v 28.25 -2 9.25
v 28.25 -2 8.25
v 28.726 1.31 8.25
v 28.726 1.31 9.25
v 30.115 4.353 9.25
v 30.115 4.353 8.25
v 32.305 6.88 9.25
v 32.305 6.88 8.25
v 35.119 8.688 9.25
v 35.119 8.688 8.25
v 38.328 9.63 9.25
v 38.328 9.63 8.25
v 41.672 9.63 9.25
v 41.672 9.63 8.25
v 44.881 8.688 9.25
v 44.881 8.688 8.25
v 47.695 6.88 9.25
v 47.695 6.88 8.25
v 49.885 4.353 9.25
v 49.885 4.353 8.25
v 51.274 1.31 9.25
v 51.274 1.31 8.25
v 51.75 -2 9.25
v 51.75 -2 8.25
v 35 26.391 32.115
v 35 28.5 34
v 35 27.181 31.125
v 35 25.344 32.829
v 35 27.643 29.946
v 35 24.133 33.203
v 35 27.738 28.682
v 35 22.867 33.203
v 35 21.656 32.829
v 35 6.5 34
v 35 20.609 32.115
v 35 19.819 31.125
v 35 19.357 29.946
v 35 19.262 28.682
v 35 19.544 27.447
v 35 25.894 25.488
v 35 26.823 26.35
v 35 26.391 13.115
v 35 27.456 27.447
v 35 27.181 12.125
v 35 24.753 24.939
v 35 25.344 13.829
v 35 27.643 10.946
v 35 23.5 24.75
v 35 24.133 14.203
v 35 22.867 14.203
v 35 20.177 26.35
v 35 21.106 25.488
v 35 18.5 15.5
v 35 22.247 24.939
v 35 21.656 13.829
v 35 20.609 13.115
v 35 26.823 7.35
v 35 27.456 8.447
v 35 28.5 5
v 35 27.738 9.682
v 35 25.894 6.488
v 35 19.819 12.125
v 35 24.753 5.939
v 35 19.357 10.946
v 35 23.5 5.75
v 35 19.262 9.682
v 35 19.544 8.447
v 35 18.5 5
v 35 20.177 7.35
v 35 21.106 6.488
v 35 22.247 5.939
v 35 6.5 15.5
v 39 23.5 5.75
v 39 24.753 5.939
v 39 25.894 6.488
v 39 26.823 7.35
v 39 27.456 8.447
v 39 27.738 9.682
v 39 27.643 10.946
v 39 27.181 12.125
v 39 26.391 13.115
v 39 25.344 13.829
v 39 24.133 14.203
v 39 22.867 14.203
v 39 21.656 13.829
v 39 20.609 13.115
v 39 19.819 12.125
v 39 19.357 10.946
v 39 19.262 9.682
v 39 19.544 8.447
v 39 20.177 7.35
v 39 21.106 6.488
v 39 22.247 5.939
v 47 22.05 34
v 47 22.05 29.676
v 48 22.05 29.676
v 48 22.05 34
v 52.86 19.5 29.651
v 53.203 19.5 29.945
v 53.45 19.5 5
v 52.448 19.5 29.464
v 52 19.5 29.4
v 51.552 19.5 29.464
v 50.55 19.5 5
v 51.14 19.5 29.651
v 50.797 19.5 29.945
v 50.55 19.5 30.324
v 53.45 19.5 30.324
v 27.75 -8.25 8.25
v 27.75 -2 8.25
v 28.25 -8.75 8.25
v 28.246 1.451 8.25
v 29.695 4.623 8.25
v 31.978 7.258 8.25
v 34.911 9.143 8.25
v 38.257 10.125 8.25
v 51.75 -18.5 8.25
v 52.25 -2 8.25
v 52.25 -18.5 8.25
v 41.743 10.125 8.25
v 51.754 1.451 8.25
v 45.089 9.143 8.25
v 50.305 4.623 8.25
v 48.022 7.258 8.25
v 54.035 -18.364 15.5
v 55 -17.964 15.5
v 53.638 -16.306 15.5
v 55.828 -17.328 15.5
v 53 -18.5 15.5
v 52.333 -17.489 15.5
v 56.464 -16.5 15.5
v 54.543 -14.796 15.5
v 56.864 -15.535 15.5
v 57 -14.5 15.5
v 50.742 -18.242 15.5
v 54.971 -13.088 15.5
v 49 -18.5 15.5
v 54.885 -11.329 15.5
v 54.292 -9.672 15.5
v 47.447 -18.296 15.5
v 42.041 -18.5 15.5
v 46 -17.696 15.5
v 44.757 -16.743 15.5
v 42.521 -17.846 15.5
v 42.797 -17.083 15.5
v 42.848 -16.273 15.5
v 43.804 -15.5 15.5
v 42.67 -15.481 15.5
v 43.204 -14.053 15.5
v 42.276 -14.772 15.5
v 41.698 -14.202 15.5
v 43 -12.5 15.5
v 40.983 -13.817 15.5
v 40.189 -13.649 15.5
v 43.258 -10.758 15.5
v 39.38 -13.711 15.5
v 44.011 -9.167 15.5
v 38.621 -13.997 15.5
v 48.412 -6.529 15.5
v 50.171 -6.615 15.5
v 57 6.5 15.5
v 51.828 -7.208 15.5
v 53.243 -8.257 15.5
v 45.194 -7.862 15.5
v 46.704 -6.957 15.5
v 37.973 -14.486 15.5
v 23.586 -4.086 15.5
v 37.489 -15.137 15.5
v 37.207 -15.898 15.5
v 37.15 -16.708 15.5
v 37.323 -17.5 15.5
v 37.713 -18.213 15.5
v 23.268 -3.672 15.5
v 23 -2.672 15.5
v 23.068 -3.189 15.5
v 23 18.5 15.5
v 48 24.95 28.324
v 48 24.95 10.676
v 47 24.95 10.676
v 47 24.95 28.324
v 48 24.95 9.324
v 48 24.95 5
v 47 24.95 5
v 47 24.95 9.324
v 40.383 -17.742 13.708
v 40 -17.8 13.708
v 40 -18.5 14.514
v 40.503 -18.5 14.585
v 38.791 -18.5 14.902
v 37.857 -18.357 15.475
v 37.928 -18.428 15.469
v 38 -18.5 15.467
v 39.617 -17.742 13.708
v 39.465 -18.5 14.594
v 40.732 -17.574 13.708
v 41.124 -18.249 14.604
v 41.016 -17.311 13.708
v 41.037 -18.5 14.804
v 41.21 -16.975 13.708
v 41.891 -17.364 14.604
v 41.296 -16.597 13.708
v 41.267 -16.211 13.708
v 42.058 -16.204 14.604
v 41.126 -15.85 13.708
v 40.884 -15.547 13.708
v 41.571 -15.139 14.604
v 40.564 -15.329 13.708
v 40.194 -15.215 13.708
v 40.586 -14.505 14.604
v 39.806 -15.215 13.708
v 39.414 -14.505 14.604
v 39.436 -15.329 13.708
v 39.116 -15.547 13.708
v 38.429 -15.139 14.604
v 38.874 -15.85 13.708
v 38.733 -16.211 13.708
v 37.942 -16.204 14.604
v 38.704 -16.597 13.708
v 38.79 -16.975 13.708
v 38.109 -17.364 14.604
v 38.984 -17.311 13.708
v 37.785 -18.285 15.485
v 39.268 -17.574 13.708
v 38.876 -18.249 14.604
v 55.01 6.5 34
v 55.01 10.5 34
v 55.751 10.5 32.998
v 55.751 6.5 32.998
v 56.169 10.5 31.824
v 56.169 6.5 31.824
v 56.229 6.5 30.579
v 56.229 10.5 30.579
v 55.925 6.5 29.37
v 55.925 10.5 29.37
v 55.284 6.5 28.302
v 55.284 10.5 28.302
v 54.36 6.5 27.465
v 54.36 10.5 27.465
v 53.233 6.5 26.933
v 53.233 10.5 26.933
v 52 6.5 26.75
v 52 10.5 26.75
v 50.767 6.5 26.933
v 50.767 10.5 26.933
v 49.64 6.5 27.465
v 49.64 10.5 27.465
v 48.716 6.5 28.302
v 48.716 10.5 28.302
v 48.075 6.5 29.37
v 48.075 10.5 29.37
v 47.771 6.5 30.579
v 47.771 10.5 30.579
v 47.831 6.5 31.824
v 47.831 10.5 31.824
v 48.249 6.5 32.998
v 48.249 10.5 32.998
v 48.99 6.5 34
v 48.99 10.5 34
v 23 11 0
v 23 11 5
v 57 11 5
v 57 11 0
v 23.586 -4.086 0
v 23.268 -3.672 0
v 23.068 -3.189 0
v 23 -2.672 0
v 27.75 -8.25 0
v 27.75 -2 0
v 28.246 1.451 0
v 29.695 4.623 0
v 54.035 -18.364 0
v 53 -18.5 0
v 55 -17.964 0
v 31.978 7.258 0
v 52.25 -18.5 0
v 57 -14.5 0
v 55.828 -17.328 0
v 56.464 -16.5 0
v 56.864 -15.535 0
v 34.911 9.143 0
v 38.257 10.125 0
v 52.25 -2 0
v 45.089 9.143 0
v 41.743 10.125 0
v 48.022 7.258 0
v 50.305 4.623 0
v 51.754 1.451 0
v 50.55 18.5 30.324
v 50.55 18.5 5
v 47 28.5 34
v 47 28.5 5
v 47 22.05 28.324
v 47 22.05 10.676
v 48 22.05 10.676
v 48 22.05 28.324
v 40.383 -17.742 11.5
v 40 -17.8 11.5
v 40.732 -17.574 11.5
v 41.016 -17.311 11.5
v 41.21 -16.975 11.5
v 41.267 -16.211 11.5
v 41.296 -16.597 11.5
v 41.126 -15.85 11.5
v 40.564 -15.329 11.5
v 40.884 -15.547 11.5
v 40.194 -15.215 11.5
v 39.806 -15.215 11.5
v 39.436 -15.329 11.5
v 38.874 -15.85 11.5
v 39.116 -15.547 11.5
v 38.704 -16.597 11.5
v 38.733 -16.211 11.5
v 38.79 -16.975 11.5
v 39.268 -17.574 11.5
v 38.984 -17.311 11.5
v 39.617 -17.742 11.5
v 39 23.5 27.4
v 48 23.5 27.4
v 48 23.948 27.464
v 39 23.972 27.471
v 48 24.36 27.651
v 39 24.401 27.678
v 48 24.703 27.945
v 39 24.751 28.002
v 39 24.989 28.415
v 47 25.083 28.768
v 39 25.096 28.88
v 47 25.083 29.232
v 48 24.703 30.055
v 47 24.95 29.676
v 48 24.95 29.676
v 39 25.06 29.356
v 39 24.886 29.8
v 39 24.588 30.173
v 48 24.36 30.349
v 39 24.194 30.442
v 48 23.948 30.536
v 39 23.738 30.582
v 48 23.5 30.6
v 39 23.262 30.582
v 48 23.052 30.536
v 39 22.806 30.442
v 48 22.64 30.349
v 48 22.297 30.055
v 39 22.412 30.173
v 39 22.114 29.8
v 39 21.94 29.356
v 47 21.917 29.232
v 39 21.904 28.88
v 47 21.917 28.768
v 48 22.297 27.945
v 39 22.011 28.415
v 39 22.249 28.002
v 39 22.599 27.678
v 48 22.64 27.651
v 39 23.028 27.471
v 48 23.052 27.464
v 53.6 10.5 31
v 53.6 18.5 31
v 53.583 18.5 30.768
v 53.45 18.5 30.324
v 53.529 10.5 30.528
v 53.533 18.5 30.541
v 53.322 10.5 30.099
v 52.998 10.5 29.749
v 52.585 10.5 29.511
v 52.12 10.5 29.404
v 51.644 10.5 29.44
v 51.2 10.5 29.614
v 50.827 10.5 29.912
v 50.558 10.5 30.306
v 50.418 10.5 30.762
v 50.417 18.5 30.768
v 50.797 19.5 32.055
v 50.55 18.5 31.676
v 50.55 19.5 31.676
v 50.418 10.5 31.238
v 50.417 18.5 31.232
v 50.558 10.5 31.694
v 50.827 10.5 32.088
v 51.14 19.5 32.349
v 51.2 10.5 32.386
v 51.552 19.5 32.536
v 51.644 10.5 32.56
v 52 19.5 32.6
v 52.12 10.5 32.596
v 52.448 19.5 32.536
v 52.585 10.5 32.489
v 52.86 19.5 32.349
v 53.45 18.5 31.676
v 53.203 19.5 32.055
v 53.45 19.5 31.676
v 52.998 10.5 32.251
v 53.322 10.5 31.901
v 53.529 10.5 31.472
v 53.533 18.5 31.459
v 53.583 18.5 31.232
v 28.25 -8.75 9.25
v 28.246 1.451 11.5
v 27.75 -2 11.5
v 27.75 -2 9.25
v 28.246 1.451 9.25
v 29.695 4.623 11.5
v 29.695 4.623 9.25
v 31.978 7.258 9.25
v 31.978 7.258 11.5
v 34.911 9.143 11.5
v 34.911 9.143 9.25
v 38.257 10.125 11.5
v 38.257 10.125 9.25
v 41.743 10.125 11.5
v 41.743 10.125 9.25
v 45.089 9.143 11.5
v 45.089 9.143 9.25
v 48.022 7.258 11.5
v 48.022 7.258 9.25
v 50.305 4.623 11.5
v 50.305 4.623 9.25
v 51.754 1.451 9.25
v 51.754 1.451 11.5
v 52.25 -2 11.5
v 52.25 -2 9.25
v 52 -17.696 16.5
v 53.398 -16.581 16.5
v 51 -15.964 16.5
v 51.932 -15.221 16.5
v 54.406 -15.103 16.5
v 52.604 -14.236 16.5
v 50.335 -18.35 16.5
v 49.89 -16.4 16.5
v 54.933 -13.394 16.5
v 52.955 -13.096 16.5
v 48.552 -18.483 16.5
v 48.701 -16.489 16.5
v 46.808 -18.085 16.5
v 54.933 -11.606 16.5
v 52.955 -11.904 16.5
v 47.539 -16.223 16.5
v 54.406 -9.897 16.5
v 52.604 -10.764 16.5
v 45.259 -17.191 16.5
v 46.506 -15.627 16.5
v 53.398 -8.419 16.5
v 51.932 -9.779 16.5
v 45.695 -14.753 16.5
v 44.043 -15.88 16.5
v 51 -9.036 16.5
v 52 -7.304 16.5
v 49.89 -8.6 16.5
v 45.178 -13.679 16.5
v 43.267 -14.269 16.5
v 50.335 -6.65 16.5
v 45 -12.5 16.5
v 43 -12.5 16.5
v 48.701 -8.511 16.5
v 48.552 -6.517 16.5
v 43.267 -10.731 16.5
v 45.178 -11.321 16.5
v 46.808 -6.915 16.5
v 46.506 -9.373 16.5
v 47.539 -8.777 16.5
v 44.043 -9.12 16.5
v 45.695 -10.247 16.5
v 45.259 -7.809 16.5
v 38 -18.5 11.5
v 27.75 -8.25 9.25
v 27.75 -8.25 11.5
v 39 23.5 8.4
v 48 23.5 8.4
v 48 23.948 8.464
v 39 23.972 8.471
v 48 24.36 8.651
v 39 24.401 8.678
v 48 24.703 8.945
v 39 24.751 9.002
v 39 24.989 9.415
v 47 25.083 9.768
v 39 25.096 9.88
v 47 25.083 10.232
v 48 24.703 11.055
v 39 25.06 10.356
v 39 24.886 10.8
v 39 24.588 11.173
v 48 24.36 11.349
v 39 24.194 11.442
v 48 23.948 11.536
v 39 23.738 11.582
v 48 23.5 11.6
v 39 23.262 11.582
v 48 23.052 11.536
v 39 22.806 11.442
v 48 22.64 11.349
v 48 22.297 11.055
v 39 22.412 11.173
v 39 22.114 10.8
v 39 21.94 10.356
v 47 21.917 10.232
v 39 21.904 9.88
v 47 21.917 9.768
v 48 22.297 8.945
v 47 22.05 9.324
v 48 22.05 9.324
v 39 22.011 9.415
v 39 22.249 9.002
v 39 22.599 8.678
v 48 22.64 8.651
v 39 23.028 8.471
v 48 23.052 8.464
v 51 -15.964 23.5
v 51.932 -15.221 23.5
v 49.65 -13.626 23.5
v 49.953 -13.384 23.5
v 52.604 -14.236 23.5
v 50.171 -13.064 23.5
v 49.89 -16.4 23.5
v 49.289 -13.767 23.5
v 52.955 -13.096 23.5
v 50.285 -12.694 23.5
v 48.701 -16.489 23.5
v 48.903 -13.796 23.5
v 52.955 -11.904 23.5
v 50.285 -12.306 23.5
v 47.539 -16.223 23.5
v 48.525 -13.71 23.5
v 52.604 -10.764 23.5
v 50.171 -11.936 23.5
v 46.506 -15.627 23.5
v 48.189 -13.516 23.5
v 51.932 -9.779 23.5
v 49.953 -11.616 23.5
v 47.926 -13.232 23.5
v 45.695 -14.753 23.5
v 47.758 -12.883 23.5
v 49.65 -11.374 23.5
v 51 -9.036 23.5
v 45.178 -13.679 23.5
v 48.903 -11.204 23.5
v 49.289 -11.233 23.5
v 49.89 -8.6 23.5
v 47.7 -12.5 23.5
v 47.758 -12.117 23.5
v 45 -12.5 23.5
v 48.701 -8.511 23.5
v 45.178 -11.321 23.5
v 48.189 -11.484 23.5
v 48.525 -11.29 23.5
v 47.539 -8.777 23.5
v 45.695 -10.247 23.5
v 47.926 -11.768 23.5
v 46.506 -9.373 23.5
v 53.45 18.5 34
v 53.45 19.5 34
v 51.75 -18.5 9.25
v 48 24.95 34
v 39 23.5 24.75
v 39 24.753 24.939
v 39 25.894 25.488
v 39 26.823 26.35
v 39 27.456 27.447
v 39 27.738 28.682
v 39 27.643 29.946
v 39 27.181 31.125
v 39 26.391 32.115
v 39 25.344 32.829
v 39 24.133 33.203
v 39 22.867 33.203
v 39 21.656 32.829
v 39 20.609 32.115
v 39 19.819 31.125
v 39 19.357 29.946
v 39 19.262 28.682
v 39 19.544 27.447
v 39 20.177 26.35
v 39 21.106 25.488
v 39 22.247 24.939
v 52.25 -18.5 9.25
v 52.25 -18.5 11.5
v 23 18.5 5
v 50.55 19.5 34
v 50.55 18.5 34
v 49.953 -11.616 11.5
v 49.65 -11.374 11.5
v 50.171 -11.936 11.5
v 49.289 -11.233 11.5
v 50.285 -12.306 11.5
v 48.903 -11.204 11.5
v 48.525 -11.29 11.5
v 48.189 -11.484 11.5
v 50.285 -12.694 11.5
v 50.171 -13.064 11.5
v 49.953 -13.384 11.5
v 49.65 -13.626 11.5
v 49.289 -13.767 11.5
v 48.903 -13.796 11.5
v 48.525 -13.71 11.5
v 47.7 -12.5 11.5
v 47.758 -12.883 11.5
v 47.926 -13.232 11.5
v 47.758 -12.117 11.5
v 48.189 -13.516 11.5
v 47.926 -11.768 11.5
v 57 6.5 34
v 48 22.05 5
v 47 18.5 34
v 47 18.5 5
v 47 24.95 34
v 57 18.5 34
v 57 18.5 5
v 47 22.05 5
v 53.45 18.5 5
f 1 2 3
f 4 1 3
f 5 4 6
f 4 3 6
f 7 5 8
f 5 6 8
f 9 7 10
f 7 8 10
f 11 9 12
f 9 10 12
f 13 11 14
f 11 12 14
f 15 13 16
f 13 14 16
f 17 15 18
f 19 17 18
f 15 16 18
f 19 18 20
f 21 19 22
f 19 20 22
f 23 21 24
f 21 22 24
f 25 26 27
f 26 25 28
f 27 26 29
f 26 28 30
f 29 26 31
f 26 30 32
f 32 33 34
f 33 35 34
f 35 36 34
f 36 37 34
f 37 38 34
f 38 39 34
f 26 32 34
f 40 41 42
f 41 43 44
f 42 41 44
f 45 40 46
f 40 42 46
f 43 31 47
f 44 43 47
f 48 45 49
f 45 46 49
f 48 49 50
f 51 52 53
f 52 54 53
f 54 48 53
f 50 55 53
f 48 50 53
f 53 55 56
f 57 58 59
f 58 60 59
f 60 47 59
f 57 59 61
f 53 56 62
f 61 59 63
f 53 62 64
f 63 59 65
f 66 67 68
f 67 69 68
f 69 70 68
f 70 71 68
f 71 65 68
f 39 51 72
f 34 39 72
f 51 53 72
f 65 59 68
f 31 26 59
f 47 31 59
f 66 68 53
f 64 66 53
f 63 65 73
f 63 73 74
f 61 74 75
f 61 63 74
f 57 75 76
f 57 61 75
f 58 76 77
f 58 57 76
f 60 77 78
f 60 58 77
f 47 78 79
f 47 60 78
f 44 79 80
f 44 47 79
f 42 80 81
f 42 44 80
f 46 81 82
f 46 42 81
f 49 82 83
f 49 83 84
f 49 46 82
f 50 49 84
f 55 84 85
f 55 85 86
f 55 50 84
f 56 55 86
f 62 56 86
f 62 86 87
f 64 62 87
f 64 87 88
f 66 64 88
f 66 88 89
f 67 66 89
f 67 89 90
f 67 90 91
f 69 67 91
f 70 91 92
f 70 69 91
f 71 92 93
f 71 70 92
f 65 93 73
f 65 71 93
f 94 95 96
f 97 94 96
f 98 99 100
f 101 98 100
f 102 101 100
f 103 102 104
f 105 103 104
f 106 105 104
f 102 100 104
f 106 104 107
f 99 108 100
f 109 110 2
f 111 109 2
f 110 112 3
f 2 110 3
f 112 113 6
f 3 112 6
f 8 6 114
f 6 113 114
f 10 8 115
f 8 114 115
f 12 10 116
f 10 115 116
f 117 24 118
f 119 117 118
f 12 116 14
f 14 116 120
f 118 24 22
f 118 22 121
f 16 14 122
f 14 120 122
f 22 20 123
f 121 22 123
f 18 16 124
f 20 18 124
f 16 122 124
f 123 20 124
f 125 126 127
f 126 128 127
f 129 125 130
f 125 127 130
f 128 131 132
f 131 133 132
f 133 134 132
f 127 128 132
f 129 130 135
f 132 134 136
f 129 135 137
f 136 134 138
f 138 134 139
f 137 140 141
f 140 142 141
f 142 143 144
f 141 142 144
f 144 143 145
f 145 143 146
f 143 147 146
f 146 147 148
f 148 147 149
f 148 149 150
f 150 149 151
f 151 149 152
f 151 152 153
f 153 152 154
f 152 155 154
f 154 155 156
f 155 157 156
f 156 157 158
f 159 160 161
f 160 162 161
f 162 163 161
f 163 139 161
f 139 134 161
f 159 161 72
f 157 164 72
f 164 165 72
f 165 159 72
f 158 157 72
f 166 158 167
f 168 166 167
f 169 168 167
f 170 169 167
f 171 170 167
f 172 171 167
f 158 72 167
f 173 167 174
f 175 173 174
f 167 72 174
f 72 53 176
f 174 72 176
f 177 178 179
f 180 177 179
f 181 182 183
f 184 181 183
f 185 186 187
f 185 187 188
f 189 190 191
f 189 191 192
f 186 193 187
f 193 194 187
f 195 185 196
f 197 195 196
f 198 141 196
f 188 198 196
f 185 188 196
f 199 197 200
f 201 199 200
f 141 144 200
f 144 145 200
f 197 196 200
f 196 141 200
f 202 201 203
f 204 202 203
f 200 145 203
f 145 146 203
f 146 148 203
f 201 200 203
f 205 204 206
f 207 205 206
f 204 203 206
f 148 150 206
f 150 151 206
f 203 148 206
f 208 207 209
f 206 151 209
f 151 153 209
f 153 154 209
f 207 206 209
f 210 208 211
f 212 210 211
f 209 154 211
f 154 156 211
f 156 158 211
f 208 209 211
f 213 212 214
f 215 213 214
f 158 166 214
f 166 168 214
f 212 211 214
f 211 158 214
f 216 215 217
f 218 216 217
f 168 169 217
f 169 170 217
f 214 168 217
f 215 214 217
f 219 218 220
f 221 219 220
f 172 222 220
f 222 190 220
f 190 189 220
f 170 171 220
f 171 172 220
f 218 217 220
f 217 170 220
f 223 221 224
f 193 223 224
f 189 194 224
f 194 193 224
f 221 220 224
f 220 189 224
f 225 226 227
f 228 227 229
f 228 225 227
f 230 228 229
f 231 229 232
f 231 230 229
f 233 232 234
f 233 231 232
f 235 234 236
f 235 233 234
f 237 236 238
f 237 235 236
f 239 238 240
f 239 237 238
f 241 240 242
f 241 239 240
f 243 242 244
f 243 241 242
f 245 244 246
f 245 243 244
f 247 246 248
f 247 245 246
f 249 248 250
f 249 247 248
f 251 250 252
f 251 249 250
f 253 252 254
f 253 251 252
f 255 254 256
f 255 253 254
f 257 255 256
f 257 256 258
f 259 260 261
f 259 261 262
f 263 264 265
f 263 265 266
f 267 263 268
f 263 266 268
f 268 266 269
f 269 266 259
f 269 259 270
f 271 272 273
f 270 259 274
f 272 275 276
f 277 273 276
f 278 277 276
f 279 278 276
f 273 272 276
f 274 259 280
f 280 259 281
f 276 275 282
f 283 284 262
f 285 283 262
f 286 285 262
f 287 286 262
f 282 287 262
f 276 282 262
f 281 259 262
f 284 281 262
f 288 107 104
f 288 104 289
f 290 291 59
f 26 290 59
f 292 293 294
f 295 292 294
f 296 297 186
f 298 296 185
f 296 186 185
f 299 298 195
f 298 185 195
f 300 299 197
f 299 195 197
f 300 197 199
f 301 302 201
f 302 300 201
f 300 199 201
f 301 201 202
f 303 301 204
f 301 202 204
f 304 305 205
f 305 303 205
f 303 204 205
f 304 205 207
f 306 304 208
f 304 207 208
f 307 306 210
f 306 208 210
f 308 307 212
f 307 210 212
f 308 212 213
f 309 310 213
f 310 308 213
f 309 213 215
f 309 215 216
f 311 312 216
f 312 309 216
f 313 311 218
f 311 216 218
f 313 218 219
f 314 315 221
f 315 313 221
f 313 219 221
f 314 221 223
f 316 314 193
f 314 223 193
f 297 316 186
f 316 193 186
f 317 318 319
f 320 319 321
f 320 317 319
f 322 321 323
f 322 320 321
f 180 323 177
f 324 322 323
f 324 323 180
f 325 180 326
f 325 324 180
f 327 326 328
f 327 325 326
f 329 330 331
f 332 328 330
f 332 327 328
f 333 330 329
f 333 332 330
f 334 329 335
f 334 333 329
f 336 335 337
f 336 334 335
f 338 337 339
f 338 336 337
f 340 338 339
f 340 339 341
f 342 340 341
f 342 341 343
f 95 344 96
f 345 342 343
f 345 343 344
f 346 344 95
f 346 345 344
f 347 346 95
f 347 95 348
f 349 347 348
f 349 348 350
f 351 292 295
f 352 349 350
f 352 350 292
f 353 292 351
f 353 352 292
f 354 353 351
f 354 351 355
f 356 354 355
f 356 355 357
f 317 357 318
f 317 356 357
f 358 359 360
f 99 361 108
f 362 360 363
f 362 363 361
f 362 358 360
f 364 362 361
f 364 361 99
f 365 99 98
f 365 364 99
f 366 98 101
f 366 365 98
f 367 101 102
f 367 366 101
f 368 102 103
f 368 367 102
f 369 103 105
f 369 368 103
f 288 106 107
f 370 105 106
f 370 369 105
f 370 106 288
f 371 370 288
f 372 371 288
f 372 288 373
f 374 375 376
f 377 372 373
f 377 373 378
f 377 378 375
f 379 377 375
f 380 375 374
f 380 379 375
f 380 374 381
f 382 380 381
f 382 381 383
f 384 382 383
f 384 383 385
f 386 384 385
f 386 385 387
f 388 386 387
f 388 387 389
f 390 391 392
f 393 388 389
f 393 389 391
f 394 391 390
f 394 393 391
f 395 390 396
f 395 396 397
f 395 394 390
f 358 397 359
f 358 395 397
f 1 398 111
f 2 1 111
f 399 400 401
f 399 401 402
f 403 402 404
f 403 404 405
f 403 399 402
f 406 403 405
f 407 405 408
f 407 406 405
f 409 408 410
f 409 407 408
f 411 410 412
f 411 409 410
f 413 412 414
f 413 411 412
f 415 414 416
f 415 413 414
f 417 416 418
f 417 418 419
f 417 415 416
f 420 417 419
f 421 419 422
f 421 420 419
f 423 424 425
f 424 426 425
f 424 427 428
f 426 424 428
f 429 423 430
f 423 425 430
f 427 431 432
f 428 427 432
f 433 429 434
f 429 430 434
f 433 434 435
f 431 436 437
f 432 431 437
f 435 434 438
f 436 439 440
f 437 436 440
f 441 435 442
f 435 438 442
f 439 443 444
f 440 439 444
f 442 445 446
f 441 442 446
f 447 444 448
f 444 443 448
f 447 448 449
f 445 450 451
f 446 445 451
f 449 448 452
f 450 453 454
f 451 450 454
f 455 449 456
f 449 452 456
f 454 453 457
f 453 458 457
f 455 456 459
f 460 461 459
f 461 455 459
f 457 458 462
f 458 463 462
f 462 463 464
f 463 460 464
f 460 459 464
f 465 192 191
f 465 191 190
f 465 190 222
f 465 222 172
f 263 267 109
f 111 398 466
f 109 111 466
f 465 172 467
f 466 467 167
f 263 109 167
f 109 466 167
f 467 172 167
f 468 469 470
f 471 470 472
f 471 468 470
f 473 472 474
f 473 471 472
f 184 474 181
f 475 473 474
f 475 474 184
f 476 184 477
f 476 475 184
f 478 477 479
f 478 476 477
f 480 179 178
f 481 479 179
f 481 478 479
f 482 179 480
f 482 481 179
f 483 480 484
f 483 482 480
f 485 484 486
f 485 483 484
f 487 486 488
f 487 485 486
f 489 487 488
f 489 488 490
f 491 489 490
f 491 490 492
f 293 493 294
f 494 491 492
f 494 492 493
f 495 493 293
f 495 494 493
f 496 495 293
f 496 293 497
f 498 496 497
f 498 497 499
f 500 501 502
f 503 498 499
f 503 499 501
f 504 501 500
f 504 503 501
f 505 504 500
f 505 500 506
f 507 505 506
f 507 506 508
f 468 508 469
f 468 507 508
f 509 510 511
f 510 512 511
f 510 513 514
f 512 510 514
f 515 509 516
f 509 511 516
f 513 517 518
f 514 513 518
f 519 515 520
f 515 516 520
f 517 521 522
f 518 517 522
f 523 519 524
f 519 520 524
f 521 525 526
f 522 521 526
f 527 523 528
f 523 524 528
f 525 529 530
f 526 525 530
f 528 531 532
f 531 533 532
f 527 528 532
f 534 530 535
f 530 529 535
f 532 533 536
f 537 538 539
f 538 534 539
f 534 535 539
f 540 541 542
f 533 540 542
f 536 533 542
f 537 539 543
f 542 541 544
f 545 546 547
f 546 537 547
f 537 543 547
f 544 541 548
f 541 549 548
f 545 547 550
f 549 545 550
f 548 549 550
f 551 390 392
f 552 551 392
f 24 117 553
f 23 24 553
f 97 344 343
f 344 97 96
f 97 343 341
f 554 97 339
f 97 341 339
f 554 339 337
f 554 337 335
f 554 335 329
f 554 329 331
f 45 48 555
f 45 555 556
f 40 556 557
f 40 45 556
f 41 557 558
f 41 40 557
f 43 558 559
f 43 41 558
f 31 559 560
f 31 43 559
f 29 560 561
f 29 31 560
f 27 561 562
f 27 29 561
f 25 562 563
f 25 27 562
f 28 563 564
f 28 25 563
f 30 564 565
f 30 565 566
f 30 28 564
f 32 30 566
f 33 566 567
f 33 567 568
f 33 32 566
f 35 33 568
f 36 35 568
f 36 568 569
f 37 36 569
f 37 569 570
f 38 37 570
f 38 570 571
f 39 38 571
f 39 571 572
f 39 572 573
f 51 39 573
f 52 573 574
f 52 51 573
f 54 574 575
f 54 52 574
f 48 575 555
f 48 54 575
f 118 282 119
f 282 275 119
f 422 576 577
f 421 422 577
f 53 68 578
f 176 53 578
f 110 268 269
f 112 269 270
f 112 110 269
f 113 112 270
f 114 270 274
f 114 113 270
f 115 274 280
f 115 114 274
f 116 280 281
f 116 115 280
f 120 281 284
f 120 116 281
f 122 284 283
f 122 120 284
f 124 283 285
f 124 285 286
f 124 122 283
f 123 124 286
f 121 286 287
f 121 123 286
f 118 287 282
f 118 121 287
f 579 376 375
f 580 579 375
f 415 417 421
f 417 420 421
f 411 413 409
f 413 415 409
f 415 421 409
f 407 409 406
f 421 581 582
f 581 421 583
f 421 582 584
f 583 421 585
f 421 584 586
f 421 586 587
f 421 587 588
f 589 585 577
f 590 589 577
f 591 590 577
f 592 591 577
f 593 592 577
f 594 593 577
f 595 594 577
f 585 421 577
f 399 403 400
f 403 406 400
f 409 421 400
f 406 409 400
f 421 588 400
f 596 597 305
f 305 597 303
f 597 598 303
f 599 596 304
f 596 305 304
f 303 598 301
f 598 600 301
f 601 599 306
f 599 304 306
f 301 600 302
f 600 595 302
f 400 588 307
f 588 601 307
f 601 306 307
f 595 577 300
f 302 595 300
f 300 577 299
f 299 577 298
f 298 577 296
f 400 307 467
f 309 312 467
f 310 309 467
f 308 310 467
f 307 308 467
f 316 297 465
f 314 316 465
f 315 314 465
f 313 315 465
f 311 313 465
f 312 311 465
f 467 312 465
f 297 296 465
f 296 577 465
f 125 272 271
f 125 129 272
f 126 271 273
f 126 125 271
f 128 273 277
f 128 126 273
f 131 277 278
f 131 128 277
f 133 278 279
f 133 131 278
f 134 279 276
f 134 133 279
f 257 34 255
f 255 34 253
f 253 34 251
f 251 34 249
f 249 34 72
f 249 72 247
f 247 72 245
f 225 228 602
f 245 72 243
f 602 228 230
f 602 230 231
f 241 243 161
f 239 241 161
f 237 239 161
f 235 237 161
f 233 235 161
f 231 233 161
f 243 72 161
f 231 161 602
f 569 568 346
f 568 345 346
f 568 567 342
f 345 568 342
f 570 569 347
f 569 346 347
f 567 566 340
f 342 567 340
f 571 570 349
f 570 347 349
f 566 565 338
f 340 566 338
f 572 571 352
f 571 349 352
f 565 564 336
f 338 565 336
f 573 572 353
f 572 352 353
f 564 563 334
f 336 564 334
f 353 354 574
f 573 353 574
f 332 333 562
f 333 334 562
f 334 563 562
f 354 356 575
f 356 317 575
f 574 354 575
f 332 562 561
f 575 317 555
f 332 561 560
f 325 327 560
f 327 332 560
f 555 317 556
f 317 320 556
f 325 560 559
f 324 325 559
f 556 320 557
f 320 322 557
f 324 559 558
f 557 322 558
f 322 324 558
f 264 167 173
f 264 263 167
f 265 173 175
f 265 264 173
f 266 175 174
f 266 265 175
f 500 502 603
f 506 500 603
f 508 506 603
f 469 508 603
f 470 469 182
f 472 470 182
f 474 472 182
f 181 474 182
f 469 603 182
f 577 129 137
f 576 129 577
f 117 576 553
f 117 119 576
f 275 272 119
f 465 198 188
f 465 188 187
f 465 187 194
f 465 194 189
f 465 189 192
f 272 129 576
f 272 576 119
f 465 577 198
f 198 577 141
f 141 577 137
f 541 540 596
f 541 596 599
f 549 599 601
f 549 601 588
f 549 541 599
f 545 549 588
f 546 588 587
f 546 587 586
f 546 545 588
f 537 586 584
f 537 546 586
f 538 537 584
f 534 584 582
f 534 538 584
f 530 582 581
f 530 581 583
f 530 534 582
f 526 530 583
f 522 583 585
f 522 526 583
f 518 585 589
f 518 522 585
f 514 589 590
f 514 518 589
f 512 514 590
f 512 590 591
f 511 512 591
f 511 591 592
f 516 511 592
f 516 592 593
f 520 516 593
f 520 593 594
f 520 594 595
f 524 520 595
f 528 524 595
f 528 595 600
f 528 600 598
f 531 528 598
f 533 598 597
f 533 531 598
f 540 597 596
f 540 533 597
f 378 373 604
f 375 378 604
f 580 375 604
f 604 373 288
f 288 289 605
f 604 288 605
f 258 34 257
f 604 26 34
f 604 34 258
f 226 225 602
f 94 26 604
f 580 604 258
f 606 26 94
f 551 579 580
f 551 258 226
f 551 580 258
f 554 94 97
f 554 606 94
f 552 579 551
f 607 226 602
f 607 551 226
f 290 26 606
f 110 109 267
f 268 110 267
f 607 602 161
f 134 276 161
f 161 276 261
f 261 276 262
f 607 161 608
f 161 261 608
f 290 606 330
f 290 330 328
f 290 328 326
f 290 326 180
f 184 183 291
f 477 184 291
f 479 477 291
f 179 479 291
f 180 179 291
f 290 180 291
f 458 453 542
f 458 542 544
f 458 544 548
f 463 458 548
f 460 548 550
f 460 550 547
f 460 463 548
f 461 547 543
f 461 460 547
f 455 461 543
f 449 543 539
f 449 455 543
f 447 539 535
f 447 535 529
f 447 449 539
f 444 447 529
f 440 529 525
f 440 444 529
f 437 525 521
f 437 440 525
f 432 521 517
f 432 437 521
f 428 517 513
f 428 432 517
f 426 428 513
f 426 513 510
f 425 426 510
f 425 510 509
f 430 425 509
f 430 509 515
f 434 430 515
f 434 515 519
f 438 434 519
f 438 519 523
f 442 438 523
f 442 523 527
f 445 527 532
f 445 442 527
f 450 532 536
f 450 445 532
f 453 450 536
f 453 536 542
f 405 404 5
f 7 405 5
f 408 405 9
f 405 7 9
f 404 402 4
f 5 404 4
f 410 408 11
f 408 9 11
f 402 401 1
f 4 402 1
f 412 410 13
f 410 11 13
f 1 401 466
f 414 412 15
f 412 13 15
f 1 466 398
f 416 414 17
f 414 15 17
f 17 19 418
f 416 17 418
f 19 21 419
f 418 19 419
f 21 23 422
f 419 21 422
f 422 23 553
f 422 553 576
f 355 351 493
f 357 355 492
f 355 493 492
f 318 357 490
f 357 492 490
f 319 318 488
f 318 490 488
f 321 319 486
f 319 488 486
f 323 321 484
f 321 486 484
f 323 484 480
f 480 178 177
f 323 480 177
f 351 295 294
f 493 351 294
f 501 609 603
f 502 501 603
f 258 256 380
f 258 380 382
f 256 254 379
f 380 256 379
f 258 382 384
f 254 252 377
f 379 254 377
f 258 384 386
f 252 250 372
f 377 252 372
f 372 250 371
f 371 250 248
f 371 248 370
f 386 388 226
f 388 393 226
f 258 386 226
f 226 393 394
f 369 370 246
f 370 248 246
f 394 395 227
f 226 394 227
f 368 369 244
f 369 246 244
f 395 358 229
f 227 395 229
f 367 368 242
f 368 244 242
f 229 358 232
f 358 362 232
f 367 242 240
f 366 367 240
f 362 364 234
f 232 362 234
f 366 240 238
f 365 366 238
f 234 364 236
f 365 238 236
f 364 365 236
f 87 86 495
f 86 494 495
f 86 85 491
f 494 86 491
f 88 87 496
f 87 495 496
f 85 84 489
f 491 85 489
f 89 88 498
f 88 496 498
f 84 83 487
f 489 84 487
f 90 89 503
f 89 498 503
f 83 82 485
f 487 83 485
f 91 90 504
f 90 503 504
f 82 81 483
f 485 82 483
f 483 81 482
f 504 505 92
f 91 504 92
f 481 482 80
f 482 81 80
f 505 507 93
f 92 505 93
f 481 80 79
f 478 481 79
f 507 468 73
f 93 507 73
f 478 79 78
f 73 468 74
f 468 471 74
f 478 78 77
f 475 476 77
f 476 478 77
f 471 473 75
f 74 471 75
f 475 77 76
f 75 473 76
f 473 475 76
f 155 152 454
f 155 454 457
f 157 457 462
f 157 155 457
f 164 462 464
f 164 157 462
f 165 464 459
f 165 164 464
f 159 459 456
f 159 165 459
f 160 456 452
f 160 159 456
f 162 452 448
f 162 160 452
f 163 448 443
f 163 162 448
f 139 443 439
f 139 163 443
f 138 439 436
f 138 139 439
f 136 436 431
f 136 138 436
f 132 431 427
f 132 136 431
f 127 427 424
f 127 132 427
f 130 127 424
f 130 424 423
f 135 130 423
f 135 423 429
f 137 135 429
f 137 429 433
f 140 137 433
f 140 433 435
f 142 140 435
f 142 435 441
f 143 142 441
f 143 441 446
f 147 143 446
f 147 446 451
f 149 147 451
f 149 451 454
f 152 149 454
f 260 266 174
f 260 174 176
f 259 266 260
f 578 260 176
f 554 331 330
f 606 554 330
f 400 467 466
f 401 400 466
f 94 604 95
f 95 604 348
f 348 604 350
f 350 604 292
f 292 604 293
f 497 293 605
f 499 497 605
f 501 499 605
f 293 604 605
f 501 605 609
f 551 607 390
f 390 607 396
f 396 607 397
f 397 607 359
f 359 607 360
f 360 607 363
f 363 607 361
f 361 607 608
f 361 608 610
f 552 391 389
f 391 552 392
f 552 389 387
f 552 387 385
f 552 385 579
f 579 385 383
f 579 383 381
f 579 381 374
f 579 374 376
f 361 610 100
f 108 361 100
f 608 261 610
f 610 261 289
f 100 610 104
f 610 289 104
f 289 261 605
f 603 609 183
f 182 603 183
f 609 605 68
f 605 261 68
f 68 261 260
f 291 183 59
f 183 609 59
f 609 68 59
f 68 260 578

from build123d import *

# Parameters (mm, degrees)
BASE_SKETCHUP_W                   = 34
BASE_SKETCHUP_H                   = 37
BASE_EXTRUSION_DEPTH              = 15.5
FIX_EXTRUSION_DEPTH               = 34
BALL_EXTRUSION_DEPTH              = 29
BALL_BEARING_BASE_SKETCHUP_R      = 6
BALL_BEARING_BASE_EXTRUSION_DEPTH = 1
BALL_BEARING_SKETCHUP_R           = 4
BALL_BEARING_EXTRUSION_DEPTH      = 7
BALL_BEARING_FIX_SKETCHUP_R       = 1.3
BALL_BEARING_FIX_HOLE_DEPTH       = 12
BOSS_EXTRU_5_DEPTH                = 11.5
BOSS_EXTRU_6_DEPTH                = 1
ESQUISSE13_W                      = 5
ESQUISSE13_H                      = 17.5
ENL_V_MAT_EXTRU_1_DEPTH           = 35
CONG_2_R                          = 4
ENL_V_MAT_EXTRU_2_DEPTH           = 16.5
CONG_4_R                          = 2
ESQUISSE16_R                      = 1.6
MAKERBEAMINTERIORHOLES1_DEPTH     = 23
ESQUISSE17_R                      = 4.25
MAKERBEAMINTERIORHOLES2_DEPTH     = 4
ESQUISSE18_R                      = 1.6
MAKERBEAMFRONTHOLE1_DEPTH         = 23
ESQUISSE19_R                      = 4.25
MAKERBEAMFRONTHOLE2_DEPTH         = 4
ESQUISSE20_W                      = 37
ESQUISSE20_H                      = 47
ENL_V_MAT_EXTRU_7_DEPTH           = 35


with BuildPart() as part:
    # Base Sketchup → Base Extrusion (new body)
    with BuildSketch(Plane.XY):
        Rectangle(BASE_SKETCHUP_W, BASE_SKETCHUP_H)
    extrude(amount=BASE_EXTRUSION_DEPTH)


with BuildPart() as body_2:
    # Fix Sketchup → Fix Extrusion (new body)
    with BuildSketch(Plane(origin=(0, 0, 0), x_dir=(-1, 0, 0), z_dir=(0, 0, -1))):
        Polygon((17, 18.5), (13.45, 18.5), (13.45, 19.5), (10.55, 19.5), (10.55, 18.5), (7, 18.5), (7, 22.05), (8, 22.05), (8, 24.95), (7, 24.95), (7, 28.5), (-5, 28.5), (-5, 6.5), (17, 6.5), align=None)
    extrude(amount=-FIX_EXTRUSION_DEPTH)


with BuildPart() as ball_extrusion_tool:
    # Ball Place Sketchup → Ball Extrusion (new body)
    with BuildSketch(Plane.XZ.offset(18.5)):
        Polygon((-12.25, 0), (-12.25, 8.25), (-11.75, 8.25), (-11.75, 9.25), (-12.25, 9.25), (-12.25, 11.5), (12.25, 11.5), (12.25, 9.25), (11.75, 9.25), (11.75, 8.25), (12.25, 8.25), (12.25, 0), align=None)
    extrude(amount=-BALL_EXTRUSION_DEPTH)


with BuildPart() as part_1:
    add(part.part)

    # Ball Extrusion: cut by ball_extrusion_tool
    add(ball_extrusion_tool.part, mode=Mode.SUBTRACT)

    # Esquisse12 → Fraisage pour vis à tête fraisée bombée #41 (revolve, cut)
    with BuildSketch(Plane(origin=(0, -16.5, 15.5), x_dir=(0, -1, 0), z_dir=(1, 0, 0))):
        Polygon((0, 0), (0, 15.5), (1.3, 15.5), (1.3, 1.791698794), (2.8575, 0), align=None)
    revolve(axis=Axis((0, -16.5, 21.85), (0, 0, -1)), mode=Mode.SUBTRACT)

    # Ball Bearing Base Sketchup → Ball Bearing Base Extrusion (add)
    with BuildSketch(Plane.XY.offset(15.5)):
        with Locations((-9, -12.5)):
            Circle(BALL_BEARING_BASE_SKETCHUP_R)
    extrude(amount=BALL_BEARING_BASE_EXTRUSION_DEPTH)

    # Ball Bearing Sketchup → Ball Bearing Extrusion (add)
    with BuildSketch(Plane.XY.offset(16.5)):
        with Locations((-9, -12.5)):
            Circle(BALL_BEARING_SKETCHUP_R)
    extrude(amount=BALL_BEARING_EXTRUSION_DEPTH)

    # Ball Bearing Fix Sketchup → Ball Bearing Fix Hole (cut)
    with BuildSketch(Plane.XY.offset(23.5)):
        with Locations((-9, -12.5)):
            Circle(BALL_BEARING_FIX_SKETCHUP_R)
    extrude(amount=-BALL_BEARING_FIX_HOLE_DEPTH, mode=Mode.SUBTRACT)



with BuildPart() as body_2_1:
    add(body_2.part)

    # Ball Extrusion: cut by ball_extrusion_tool
    add(ball_extrusion_tool.part, mode=Mode.SUBTRACT)


with BuildPart() as part_2:
    add(part_1.part)

    add(body_2_1.part)  # Boss.-Extru.5 merges body 2
    # Esquisse10 → Boss.-Extru.5 (add)
    with BuildSketch(Plane(origin=(0, 0, 11.5), x_dir=(-1, 0, 0), z_dir=(0, 0, -1))):
        with BuildLine():
            Line((12.25, -2), (12.25, 10.5))
            Line((12.25, 10.5), (-12.25, 10.5))
            Line((-12.25, 10.5), (-12.25, -2))
            ThreePointArc((-12.25, -2), (0, 10.25), (12.25, -2))
        make_face()
    extrude(amount=BOSS_EXTRU_5_DEPTH)

    # Esquisse11 → Boss.-Extru.6 (add)
    with BuildSketch(Plane(origin=(0, 0, 8.25), x_dir=(-1, 0, 0), z_dir=(0, 0, -1))):
        with BuildLine():
            Line((11.75, -2), (12.25, -2))
            Line((12.25, -2), (12.25, 10.25))
            Line((12.25, 10.25), (-12.25, 10.25))
            Line((-12.25, 10.25), (-12.25, -2))
            Line((-12.25, -2), (-11.75, -2))
            ThreePointArc((-11.75, -2), (0, 9.75), (11.75, -2))
        make_face()
    extrude(amount=-BOSS_EXTRU_6_DEPTH)

    # Esquisse13 → Enlèv. mat.-Extru.1 (cut, through all)
    with BuildSketch(Plane(origin=(17, 0, 0), x_dir=(0, 0, -1), z_dir=(1, 0, 0))):
        with Locations((-2.5, 19.75)):
            Rectangle(ESQUISSE13_W, ESQUISSE13_H)
    extrude(amount=-ENL_V_MAT_EXTRU_1_DEPTH, mode=Mode.SUBTRACT)

    # Congé2
    cong_2_edges = [part_2.edges().sort_by_distance(p)[0] for p in [
        (-17, -18.5, 7.75),
    ]]
    fillet(cong_2_edges, radius=CONG_2_R)

    # Esquisse14 → Enlèv. mat.-Extru.2 (cut, through all)
    with BuildSketch(Plane.XY.offset(15.5)):
        Polygon((2, -18.5), (17, -3.5), (17, -18.5), align=None)
    extrude(amount=-ENL_V_MAT_EXTRU_2_DEPTH, mode=Mode.SUBTRACT)

    # Congé4
    cong_4_edges = [part_2.edges().sort_by_distance(p)[0] for p in [
        (17, -3.5, 7.75),
    ]]
    fillet(cong_4_edges, radius=CONG_4_R)

    # Esquisse16 → MakerBeamInteriorHoles1 (cut, through all)
    with BuildSketch(Plane(origin=(5, 0, 0), x_dir=(0, 0, -1), z_dir=(1, 0, 0))):
        with Locations((-29, 23.5)):
            Circle(ESQUISSE16_R)
        with Locations((-10, 23.5)):
            Circle(ESQUISSE16_R)
    extrude(amount=-MAKERBEAMINTERIORHOLES1_DEPTH, mode=Mode.SUBTRACT)

    # Esquisse17 → MakerBeamInteriorHoles2 (cut)
    with BuildSketch(Plane(origin=(5, 0, 0), x_dir=(0, 0, -1), z_dir=(1, 0, 0))):
        with Locations((-29, 23.5)):
            Circle(ESQUISSE17_R)
        with Locations((-10, 23.5)):
            Circle(ESQUISSE17_R)
    extrude(amount=-MAKERBEAMINTERIORHOLES2_DEPTH, mode=Mode.SUBTRACT)

    # Esquisse18 → MakerBeamFrontHole1 (cut, through all)
    with BuildSketch(Plane(origin=(0, 6.5, 0), x_dir=(-1, 0, 0), z_dir=(0, -1, 0))):
        with Locations((12, -31)):
            Circle(ESQUISSE18_R)
    extrude(amount=-MAKERBEAMFRONTHOLE1_DEPTH, mode=Mode.SUBTRACT)

    # Esquisse19 → MakerBeamFrontHole2 (cut)
    with BuildSketch(Plane(origin=(0, 6.5, 0), x_dir=(-1, 0, 0), z_dir=(0, -1, 0))):
        with Locations((12, -31)):
            Circle(ESQUISSE19_R)
    extrude(amount=-MAKERBEAMFRONTHOLE2_DEPTH, mode=Mode.SUBTRACT)


with BuildPart() as body_2_2:
    # Symétrie2: mirrored copy
    add(part_2.part.mirror(Plane(origin=(20, 0, 0), x_dir=(0, 0, 1), z_dir=(1, 0, 0))))


with BuildPart() as part_3:
    add(part_2.part)

    # Esquisse20 → Enlèv. mat.-Extru.7 (cut, through all)
    with BuildSketch(Plane.XY.offset(34)):
        with Locations((1.5, 5)):
            Rectangle(ESQUISSE20_W, ESQUISSE20_H)
    extrude(amount=-ENL_V_MAT_EXTRU_7_DEPTH, mode=Mode.SUBTRACT)


solid = body_2_2.part
